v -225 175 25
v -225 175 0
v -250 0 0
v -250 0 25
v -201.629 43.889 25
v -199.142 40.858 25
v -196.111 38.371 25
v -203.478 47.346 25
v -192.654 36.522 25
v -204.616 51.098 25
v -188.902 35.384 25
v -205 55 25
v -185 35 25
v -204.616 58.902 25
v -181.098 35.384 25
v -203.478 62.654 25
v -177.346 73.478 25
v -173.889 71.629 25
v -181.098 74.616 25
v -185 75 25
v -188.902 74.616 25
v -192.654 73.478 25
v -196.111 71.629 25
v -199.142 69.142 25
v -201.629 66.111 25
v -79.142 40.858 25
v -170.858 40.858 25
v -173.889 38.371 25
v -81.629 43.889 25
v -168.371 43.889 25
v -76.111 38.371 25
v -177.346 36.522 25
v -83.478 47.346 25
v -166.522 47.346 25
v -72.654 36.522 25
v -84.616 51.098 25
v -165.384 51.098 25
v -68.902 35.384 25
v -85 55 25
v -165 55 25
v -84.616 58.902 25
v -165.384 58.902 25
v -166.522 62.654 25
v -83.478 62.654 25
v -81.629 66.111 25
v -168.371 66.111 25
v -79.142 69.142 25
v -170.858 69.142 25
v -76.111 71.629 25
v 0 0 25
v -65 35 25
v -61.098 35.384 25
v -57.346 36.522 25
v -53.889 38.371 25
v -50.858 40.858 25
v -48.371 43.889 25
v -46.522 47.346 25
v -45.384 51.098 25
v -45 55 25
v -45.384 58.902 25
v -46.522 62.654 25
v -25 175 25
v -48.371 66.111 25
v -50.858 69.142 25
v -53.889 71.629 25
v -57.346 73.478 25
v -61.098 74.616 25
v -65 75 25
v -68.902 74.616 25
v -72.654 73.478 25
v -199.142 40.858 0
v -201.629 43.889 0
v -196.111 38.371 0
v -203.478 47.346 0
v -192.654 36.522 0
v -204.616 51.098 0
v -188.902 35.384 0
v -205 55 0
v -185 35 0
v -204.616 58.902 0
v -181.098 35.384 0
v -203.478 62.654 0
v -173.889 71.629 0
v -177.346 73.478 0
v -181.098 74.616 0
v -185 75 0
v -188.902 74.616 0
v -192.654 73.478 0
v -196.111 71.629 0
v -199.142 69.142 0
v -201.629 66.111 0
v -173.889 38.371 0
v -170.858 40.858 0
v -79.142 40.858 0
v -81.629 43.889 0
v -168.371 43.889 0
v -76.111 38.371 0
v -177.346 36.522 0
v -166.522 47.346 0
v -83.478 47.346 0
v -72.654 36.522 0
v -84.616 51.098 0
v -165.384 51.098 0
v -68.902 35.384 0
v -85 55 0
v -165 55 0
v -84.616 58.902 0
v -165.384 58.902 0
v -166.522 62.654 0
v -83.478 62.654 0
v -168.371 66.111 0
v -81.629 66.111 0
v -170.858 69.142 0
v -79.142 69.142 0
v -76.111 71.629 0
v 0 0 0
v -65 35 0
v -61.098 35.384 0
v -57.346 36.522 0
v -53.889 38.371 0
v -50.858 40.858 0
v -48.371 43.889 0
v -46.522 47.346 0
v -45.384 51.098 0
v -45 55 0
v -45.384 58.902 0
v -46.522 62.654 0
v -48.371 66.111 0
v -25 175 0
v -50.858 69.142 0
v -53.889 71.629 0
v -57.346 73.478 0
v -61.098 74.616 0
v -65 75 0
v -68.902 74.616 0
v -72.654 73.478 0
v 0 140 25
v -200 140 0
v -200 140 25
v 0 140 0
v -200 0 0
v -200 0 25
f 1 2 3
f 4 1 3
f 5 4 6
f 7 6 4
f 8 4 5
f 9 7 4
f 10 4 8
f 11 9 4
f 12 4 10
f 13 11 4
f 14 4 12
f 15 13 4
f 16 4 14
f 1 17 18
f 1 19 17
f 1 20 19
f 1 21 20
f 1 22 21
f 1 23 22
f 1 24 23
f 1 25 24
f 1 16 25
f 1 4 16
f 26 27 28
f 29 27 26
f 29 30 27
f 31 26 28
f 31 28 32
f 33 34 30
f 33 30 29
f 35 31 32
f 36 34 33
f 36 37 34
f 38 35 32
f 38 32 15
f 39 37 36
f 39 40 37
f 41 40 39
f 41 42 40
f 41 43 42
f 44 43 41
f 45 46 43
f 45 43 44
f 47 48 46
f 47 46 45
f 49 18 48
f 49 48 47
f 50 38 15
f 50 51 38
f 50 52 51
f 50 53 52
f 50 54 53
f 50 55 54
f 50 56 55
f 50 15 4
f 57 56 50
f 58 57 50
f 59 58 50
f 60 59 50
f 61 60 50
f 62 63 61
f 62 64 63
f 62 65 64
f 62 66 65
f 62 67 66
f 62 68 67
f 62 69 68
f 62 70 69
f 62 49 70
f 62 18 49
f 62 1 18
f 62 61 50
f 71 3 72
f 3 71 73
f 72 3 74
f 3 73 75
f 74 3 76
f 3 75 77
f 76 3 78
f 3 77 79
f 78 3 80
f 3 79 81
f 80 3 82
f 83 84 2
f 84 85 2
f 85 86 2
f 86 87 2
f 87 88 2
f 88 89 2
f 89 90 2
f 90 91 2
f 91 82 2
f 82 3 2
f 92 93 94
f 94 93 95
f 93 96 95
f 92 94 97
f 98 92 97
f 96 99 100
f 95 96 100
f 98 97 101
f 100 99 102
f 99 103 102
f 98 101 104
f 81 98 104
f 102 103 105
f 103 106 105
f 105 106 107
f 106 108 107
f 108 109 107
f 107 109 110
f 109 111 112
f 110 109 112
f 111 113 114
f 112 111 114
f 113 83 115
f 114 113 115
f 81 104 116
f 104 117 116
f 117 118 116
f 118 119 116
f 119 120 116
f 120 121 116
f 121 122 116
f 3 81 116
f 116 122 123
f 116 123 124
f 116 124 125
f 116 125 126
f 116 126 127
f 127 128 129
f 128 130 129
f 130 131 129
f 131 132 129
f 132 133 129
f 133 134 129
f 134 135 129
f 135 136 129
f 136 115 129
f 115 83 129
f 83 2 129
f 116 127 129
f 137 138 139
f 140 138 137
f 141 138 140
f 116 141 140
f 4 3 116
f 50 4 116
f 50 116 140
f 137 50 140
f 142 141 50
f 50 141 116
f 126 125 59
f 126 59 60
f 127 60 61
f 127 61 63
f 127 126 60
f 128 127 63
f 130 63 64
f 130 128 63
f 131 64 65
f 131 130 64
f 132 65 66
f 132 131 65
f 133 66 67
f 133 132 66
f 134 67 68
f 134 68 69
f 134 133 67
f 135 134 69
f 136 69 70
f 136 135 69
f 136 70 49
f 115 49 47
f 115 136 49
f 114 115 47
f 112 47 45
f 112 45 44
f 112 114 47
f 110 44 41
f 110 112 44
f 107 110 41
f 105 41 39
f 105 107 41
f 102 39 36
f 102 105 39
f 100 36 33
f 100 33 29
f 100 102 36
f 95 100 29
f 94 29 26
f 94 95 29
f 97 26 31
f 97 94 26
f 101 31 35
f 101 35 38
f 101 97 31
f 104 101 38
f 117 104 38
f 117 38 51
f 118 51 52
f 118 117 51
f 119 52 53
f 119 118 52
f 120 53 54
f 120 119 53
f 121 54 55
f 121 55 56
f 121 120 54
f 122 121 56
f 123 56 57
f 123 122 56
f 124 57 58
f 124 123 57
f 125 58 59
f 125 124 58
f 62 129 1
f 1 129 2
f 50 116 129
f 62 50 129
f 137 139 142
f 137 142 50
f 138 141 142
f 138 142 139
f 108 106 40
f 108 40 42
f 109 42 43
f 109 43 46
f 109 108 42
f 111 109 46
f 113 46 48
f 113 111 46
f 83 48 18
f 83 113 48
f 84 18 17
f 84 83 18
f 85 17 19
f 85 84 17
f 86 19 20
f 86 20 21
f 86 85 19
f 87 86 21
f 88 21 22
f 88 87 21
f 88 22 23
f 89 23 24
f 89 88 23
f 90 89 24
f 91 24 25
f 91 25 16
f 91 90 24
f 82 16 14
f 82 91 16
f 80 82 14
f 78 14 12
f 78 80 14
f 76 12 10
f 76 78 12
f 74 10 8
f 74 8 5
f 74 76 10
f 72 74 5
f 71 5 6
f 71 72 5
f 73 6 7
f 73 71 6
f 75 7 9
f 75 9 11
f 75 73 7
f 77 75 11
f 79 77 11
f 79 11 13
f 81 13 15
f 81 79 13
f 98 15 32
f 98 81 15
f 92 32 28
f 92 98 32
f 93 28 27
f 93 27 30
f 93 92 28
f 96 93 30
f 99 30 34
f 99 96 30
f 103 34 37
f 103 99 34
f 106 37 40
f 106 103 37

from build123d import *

# Parameters (mm, degrees)
F0_W     = 200
F0_H     = 140
F1_DEPTH = 25
F2_R     = 20
F3_DEPTH = 25


with BuildPart() as f1:
    # F0 (on Top) → F1 (new body)
    with BuildSketch(Plane.XY):
        with Locations((-100, 70)):
            Rectangle(F0_W, F0_H)
    extrude(amount=F1_DEPTH)


with BuildPart() as f3:
    # F2 (on Top) → F3 (new body)
    with BuildSketch(Plane.XY):
        Polygon((-250, 0), (0, 0), (-25, 175), (-225, 175), align=None)
        with Locations((-185, 55)):
            Circle(F2_R, mode=Mode.SUBTRACT)
        with Locations((-65, 55)):
            Circle(F2_R, mode=Mode.SUBTRACT)
    extrude(amount=F3_DEPTH)


solid = Compound([f1.part, f3.part])
